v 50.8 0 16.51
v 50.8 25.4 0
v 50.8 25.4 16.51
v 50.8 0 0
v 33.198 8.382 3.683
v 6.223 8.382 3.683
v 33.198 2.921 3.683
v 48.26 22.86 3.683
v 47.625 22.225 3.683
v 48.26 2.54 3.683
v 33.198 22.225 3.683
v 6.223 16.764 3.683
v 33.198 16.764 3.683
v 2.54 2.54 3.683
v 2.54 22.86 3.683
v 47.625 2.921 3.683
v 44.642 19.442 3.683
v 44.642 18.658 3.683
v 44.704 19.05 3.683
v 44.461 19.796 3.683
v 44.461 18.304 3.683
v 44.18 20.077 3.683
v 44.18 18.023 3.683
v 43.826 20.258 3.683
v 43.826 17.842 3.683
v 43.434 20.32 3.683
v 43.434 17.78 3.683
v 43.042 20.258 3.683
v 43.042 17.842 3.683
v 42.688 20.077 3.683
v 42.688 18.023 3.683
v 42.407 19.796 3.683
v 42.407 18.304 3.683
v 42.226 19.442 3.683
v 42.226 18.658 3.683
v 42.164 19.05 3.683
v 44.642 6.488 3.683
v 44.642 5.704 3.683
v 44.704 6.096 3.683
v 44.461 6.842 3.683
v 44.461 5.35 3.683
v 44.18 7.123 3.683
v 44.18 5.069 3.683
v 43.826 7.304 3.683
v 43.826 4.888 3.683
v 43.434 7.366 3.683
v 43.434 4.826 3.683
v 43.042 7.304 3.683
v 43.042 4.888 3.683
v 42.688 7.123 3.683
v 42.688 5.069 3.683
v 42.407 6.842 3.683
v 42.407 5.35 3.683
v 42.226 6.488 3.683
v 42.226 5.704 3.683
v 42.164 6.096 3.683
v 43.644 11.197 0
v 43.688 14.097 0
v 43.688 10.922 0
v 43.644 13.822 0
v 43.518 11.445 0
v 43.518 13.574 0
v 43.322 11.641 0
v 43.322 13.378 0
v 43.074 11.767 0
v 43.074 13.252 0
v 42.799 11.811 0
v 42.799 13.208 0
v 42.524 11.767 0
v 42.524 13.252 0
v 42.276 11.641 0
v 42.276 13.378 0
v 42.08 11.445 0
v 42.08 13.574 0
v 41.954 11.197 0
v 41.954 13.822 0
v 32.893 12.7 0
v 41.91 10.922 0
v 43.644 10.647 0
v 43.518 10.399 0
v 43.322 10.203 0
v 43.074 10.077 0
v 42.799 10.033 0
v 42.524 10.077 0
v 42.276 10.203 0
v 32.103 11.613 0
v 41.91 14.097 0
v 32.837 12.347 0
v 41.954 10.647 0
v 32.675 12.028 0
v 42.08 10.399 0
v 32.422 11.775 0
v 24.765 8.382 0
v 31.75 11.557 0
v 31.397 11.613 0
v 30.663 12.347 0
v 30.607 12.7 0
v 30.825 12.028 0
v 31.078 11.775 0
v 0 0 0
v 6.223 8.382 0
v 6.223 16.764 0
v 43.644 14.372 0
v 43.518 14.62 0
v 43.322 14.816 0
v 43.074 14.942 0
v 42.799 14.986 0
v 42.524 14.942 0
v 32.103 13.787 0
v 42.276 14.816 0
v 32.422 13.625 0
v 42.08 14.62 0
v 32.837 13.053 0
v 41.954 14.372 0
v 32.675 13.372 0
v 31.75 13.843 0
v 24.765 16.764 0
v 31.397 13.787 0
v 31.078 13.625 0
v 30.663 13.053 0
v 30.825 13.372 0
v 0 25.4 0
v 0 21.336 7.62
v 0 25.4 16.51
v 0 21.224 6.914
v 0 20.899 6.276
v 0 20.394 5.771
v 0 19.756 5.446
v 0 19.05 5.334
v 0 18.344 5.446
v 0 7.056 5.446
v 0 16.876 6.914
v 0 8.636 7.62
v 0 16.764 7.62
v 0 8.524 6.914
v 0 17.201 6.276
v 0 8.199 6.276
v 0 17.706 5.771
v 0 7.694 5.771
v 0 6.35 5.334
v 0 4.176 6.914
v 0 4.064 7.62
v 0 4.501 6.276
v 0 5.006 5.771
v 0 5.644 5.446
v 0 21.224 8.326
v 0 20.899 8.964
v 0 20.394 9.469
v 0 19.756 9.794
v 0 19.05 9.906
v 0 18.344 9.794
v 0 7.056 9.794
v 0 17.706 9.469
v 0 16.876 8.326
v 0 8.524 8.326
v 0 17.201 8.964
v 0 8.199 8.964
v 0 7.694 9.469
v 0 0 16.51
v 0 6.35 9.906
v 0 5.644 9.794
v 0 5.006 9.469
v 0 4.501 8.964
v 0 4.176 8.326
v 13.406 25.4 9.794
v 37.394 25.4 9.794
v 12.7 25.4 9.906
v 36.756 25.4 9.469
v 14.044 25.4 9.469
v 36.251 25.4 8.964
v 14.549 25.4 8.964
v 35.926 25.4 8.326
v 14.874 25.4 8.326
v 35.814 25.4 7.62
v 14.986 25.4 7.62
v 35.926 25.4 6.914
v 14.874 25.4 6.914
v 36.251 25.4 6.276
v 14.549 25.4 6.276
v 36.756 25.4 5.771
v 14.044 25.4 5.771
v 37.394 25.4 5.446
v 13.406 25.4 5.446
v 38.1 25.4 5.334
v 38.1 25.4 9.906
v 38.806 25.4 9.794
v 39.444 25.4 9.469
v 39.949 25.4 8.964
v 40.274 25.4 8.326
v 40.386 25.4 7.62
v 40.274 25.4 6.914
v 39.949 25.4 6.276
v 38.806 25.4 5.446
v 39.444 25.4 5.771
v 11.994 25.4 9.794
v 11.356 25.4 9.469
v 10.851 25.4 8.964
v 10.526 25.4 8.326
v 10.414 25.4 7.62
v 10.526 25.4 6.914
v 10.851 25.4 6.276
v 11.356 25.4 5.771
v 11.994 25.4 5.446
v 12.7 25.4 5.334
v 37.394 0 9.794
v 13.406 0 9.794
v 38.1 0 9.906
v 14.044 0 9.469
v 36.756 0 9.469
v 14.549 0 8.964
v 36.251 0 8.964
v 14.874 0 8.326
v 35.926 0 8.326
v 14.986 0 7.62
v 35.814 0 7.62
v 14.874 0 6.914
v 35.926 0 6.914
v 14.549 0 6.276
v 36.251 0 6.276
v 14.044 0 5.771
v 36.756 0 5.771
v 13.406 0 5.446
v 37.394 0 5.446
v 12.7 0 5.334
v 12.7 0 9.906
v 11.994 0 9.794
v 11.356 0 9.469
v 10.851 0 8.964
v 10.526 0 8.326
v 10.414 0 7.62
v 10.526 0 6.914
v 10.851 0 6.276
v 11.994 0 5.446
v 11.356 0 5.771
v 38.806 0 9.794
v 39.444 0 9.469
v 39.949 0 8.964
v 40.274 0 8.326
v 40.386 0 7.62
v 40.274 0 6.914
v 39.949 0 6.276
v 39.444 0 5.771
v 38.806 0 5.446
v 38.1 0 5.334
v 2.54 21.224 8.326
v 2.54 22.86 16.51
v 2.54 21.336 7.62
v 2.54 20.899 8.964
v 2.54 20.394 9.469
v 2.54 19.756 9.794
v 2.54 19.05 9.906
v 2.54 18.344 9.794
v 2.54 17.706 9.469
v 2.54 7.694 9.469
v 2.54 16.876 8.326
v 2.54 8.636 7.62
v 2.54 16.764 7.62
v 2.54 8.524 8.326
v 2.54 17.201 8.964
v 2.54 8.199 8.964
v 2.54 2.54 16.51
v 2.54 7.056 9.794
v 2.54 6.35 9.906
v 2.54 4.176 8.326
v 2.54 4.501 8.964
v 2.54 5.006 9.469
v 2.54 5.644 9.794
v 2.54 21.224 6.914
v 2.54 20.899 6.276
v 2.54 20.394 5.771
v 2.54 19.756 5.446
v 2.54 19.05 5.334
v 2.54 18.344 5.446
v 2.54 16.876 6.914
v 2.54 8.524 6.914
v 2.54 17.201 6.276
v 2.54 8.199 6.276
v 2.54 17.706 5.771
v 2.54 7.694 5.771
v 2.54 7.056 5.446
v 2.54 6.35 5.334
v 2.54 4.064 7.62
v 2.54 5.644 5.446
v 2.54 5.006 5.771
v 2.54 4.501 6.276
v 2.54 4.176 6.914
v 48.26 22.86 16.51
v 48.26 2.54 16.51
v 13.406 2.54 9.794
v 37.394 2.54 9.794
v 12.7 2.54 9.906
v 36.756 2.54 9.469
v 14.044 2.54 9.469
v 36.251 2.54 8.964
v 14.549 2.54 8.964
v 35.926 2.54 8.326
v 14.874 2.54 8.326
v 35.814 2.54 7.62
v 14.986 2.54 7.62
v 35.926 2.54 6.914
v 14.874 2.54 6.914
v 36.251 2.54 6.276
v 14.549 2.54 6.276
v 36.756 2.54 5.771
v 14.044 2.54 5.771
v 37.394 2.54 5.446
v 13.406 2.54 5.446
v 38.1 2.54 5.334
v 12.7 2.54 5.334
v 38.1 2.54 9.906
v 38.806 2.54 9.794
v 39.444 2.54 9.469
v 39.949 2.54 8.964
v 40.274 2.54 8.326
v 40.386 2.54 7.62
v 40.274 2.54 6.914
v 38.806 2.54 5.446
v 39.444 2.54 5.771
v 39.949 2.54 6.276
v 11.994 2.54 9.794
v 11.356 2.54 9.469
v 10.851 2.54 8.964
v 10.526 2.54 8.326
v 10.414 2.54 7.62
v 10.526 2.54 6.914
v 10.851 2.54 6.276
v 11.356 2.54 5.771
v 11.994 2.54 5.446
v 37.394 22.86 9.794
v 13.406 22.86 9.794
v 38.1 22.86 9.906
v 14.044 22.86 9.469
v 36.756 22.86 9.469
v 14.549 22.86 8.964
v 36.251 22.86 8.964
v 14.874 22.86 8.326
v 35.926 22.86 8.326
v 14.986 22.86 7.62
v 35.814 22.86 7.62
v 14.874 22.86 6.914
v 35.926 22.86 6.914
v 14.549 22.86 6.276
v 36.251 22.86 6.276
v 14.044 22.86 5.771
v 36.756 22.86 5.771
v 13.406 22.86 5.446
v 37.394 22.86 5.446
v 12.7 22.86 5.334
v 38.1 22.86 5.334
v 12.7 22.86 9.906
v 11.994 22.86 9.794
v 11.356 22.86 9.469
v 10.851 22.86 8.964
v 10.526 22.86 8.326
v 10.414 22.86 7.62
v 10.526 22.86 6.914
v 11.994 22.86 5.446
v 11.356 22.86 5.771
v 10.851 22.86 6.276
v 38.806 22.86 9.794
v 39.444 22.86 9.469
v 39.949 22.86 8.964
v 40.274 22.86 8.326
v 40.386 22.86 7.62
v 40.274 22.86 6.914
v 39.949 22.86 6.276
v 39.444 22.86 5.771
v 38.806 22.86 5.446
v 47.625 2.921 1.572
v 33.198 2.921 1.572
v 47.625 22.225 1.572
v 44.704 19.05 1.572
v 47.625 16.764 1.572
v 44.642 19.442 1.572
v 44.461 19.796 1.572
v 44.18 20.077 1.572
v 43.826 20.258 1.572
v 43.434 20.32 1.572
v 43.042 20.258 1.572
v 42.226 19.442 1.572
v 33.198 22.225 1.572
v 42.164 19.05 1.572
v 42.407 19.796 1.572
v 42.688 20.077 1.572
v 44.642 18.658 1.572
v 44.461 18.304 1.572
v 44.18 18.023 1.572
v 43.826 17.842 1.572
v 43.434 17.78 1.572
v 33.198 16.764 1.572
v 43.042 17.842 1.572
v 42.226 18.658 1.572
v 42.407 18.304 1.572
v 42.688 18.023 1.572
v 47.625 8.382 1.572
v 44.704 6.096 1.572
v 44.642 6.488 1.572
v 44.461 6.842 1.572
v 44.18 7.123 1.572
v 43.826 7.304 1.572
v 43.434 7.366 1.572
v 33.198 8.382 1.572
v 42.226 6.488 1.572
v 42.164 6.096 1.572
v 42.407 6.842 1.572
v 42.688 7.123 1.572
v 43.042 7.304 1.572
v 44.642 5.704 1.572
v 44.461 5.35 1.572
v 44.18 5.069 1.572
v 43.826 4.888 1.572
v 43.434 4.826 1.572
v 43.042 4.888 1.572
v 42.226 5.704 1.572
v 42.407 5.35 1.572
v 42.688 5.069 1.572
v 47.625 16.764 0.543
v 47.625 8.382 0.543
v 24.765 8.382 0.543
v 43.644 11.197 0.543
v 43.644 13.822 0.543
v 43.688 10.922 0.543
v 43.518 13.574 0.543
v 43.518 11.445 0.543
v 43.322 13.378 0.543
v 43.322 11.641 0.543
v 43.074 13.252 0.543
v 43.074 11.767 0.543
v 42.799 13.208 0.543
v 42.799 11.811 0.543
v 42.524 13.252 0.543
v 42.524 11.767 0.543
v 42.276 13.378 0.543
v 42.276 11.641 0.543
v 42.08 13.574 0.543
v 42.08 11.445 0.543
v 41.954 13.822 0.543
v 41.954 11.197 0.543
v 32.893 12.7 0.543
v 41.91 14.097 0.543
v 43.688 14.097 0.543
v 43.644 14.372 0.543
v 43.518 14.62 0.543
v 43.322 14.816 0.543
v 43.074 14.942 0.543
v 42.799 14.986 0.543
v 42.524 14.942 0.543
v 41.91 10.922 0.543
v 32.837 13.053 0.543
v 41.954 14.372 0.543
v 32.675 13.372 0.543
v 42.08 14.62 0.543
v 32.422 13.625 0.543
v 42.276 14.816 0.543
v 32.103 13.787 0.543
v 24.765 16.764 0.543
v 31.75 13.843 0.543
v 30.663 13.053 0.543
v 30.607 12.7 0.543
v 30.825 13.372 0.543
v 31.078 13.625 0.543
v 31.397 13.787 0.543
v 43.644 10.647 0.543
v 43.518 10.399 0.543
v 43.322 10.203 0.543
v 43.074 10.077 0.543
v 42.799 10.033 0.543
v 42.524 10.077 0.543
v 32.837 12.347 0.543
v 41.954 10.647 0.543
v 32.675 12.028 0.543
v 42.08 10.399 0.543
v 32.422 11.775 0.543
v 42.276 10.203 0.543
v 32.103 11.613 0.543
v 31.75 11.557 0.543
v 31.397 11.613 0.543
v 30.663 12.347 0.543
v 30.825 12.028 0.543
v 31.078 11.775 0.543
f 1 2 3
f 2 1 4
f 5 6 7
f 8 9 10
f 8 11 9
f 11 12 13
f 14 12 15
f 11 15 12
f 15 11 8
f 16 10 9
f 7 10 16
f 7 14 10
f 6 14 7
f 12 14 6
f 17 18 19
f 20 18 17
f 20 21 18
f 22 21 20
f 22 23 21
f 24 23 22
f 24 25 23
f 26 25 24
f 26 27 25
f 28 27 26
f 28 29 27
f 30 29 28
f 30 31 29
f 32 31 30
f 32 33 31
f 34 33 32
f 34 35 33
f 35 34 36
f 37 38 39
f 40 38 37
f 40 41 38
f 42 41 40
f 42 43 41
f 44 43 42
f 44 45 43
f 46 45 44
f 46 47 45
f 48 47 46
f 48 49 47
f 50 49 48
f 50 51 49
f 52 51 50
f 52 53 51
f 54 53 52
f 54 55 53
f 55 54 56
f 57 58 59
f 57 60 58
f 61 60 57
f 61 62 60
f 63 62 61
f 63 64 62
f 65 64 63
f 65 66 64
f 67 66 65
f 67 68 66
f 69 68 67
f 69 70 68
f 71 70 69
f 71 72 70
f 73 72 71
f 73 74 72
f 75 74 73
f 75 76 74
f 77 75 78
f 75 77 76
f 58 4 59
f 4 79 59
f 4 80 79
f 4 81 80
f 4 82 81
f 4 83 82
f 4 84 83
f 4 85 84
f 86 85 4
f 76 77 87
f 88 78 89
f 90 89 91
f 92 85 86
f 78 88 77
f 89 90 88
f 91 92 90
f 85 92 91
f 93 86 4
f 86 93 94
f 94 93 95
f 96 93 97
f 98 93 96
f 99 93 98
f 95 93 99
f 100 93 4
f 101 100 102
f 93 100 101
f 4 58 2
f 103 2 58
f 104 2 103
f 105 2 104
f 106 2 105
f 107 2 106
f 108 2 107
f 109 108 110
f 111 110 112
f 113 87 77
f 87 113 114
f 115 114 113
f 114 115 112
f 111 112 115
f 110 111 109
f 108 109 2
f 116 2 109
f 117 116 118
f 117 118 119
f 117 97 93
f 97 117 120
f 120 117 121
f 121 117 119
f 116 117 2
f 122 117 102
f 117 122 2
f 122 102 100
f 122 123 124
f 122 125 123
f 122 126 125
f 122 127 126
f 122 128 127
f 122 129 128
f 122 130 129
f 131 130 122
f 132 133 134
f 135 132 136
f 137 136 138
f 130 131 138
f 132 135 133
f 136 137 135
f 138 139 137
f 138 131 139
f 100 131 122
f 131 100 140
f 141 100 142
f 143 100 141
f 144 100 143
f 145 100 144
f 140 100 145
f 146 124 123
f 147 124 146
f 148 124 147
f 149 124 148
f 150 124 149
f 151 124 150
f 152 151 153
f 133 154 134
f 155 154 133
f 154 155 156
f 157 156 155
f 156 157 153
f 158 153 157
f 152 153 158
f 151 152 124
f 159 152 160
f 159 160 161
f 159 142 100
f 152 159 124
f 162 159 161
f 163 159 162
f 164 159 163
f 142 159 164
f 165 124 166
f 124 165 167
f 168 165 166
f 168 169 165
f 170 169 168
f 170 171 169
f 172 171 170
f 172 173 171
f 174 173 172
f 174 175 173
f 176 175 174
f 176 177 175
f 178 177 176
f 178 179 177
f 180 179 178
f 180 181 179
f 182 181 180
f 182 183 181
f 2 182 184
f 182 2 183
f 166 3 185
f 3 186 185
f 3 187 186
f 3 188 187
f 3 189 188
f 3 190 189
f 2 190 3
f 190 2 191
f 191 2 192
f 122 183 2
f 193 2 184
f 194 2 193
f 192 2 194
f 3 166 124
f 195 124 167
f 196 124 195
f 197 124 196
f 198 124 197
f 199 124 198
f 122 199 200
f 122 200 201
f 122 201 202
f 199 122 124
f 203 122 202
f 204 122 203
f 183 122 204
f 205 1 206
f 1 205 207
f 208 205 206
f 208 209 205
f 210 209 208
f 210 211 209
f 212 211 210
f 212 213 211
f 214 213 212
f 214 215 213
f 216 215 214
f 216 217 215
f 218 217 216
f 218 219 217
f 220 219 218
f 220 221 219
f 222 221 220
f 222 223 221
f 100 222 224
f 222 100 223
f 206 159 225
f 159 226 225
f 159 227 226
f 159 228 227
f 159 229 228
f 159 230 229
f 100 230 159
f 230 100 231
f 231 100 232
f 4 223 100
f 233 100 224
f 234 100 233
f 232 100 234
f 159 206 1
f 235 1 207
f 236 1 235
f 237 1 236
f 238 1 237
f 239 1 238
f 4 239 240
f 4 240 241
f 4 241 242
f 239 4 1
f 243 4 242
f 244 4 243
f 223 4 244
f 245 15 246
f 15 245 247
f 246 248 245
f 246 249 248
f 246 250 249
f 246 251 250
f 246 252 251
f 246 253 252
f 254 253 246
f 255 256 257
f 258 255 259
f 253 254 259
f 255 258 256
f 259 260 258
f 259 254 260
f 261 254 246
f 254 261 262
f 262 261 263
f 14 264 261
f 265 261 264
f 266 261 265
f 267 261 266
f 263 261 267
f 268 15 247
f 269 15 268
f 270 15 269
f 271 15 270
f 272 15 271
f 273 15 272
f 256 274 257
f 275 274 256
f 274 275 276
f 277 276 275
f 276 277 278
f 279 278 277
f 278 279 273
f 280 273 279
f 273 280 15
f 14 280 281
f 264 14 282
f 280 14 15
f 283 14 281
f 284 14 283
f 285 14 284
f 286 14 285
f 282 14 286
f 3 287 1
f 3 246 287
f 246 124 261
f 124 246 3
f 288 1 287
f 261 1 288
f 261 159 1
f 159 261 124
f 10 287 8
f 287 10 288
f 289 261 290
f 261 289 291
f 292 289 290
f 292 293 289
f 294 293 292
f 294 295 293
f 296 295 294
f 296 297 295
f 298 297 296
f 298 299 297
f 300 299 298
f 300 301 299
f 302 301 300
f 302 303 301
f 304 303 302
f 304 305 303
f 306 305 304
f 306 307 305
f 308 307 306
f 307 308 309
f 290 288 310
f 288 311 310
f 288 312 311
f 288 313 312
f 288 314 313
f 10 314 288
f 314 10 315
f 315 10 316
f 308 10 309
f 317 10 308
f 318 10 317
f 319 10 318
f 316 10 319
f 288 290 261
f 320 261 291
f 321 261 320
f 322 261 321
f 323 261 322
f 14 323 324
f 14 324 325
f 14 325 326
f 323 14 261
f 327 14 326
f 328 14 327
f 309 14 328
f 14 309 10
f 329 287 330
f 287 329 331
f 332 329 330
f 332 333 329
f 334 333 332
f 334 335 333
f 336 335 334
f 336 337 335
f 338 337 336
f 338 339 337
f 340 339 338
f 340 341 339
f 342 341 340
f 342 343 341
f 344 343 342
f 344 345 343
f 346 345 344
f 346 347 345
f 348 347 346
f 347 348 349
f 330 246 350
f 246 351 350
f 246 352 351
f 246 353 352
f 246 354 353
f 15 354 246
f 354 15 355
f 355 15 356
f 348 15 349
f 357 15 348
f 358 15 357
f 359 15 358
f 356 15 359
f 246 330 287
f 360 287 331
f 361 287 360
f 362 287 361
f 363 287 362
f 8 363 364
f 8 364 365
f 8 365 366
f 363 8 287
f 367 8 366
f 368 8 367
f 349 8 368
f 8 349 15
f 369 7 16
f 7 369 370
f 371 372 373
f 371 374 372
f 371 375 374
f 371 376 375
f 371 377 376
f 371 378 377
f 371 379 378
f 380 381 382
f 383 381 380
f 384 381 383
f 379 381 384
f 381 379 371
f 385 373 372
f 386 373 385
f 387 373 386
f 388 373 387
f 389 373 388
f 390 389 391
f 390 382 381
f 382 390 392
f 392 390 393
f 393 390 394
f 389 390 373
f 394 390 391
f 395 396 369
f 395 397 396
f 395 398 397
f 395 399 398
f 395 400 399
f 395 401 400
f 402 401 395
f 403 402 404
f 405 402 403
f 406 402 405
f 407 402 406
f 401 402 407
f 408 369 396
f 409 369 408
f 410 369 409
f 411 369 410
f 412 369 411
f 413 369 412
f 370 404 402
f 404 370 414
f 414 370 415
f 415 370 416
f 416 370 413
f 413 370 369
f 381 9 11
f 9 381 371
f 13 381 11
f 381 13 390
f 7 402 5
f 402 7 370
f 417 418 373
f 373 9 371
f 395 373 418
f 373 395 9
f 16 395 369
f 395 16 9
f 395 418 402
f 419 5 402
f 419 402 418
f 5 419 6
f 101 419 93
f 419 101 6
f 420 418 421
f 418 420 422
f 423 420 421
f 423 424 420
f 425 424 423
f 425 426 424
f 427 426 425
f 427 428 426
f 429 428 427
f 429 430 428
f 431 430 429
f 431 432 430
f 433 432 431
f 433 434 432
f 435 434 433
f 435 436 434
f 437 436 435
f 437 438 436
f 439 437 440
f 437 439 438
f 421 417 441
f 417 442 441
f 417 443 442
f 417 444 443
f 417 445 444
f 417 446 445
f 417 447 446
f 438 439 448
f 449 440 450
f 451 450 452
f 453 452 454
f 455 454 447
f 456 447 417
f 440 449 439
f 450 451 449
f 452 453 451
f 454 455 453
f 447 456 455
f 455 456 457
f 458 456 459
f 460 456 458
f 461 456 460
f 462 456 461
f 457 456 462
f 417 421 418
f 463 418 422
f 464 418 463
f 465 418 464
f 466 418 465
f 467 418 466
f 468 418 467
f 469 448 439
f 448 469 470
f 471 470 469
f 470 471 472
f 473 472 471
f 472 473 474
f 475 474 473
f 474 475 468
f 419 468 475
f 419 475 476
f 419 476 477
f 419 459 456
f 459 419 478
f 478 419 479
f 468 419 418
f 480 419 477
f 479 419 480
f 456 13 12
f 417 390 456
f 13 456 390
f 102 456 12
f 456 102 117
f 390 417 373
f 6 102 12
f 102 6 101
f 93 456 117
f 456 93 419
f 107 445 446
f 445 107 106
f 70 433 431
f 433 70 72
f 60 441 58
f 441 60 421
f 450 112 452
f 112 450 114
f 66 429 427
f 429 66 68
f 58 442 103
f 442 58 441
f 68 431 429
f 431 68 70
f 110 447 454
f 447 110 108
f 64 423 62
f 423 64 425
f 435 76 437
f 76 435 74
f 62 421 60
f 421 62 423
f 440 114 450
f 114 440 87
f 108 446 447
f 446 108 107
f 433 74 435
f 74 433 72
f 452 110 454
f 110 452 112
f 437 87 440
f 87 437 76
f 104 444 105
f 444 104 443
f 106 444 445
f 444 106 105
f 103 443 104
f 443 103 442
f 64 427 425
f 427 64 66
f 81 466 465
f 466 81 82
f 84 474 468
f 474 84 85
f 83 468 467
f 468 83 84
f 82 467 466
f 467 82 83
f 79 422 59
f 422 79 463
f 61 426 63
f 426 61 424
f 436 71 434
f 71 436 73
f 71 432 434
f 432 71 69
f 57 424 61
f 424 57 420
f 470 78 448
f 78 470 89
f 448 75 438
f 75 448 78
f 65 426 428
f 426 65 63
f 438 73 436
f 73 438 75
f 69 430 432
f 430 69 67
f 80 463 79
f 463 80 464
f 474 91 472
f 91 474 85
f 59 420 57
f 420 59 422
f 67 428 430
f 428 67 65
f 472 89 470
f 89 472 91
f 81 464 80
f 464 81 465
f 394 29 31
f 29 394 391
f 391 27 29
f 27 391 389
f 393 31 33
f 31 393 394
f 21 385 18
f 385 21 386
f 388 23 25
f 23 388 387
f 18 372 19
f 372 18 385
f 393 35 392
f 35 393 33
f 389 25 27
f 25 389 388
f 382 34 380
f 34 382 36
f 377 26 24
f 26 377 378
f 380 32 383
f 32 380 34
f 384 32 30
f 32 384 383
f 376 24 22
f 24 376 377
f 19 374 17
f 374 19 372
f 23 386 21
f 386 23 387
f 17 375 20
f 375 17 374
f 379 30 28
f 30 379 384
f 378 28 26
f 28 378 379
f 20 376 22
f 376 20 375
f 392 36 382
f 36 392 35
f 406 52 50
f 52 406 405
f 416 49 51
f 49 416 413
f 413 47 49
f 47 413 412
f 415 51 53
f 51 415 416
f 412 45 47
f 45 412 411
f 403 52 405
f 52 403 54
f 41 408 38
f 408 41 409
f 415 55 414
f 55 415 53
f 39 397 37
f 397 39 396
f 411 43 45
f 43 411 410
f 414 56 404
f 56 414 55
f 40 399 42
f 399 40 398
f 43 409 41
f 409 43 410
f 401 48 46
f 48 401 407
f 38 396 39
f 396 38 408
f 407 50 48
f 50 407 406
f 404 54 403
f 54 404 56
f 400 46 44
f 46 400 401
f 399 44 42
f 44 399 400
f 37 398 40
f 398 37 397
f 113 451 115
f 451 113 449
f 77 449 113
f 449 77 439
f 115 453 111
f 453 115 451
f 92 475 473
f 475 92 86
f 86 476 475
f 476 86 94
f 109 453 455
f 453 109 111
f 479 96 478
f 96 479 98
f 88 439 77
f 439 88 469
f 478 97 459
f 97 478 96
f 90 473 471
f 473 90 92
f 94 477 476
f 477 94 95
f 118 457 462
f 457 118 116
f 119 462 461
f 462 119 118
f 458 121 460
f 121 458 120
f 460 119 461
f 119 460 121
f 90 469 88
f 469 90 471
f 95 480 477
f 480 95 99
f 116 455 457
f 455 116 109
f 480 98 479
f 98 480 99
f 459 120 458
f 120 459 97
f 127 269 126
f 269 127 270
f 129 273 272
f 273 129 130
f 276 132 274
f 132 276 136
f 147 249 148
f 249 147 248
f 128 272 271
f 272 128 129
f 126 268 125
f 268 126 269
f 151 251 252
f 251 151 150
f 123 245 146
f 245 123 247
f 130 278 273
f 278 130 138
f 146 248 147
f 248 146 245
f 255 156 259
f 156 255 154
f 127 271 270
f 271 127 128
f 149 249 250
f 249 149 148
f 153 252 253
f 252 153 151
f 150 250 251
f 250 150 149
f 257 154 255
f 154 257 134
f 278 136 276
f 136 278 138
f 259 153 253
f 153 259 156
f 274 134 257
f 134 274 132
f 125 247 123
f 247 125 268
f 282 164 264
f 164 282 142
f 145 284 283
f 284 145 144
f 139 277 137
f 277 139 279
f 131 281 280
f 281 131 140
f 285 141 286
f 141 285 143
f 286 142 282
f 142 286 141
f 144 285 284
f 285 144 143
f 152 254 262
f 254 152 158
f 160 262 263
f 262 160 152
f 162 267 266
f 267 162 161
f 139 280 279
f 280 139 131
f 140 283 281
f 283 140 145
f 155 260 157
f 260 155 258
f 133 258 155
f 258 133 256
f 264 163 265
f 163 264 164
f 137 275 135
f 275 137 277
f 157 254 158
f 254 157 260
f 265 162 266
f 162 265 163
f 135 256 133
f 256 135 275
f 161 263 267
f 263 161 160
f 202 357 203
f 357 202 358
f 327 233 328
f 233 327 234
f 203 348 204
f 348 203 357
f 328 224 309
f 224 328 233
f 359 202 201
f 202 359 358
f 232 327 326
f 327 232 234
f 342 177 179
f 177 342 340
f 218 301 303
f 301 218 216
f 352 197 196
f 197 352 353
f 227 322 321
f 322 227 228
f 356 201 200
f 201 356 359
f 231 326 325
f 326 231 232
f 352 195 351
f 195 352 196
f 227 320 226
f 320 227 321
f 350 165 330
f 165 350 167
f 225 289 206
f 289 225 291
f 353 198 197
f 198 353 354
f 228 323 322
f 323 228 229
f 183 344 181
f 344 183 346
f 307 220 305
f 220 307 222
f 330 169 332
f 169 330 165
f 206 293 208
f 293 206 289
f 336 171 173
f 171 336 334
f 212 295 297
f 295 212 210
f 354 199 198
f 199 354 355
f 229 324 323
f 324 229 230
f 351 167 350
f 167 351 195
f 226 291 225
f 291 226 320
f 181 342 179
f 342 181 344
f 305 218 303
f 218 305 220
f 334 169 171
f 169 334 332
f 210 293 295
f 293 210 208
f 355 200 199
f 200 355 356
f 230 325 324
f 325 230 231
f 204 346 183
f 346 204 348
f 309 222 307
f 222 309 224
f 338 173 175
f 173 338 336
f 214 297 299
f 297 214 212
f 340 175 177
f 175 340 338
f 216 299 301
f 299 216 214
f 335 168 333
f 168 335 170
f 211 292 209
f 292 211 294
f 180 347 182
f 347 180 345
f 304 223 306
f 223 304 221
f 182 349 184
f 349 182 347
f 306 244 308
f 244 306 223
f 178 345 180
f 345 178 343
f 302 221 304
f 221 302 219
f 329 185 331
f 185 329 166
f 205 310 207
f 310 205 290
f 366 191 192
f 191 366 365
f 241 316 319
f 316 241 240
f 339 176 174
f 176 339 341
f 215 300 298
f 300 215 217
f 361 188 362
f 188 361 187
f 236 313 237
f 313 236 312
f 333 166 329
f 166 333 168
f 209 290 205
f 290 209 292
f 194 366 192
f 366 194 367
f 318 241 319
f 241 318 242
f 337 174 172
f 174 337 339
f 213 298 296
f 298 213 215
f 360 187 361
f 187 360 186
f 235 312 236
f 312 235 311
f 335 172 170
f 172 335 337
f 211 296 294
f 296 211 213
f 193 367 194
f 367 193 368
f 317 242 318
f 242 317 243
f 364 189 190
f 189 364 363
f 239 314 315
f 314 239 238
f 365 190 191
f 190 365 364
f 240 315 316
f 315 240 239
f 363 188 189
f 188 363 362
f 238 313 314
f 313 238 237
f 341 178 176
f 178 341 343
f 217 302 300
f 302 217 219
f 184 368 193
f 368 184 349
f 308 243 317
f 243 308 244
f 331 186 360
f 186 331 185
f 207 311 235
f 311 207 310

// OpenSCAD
/* version 3 - walls on all four sides of the box.
	based on ideas from robot base mounting, feb 18.
*/

width=inch(1);
thickness=inch(0.125);

mtgthick=inch(0.1);

extra_thick=inch(0.020);

length=inch(2);
diagthick=2;

holedia = inch(0.180);

function inch(a) = a*25.4;

module mytriangle()
{
    intersection() {
	cube([width, diagthick, width]);
	translate([-width+6, 0, 0]) {
	    rotate([0, 45, 0]) {
		cube([width, diagthick, width]);
	    }
	}    
    }
}

module bracket() {
    union(){
	// bottom - where sensor goes
	cube([inch(2),   inch(1), thickness+extra_thick  ]);   

	// vertical mounting tabs - short sides
	cube([mtgthick, inch(1), inch(0.65)]);

	translate([inch(2)-mtgthick, 0, 0]) {
	    cube([mtgthick, inch(1), inch(0.65)]);
	}

	// long sides
	cube([inch(2), mtgthick, inch(0.65)]);

	translate([0, inch(1)-mtgthick, 0]) {
	    cube([inch(2), mtgthick, inch(0.65)]);
	}


    }
}

// positive model of wcp hall-effect sensor
module wcp971() {

    difference() {
	union(){
	    cube([inch(.760), inch(.568), inch(.0635)+extra_thick]);
	    translate([ inch((.760-.330)/2), 0, 0]) {
		cube([ inch(.330), inch(1.500), inch(.104)+extra_thick]);
	    }
	    translate([ inch((.760-.330)/2), inch(0.9), 0]) {
		cube([ inch(.330), inch(0.730), inch(.2)]);
	    }
	    
	    translate([inch((.760-.12)/2 ), inch(.190), -1]) {
		cylinder(h=8, d=inch(.07),  $fn=20);
	    }
	    translate([inch(.760-(.750-.12)/2 ), inch(.190), -1]) {
		cylinder(h=8, d=inch(.07),  $fn=20);
	    }

 
	}

	translate([inch((.760-.510)/2 ), inch(.165), -1]) {
	    cylinder(h=8,d=inch(.100),  $fn=20);
	}

	translate([inch(.760 - (.760-.510)/2 ), inch(.165), -1]) {
	    cylinder(h=8,d=inch(.100),  $fn=20);
	}

    }
}

// put it all together
union(){
    difference () {
	bracket();

	translate([inch(1.875),inch(.875), thickness+0.010+extra_thick]) {
	    rotate([0,180,90]) {
		wcp971();
	    }
	}

	// hole to aid in removing sensor from bracket
	translate([inch(1.25), inch(0.5), -1]) {
	    cylinder(h=8,d=inch(0.09),  $fn=20);
	}

	    // holes in vertical mounting frame - short side
	translate([-1, inch(0.75),inch(0.3) ]) {
	    rotate([0,90,0]) {
		cylinder(h=8,d=holedia,  $fn=20);
	    }
        }
	translate([-1, inch(0.25), inch(0.3) ]) {
	    rotate([0,90,0]) {
		cylinder(h=8,d=holedia, $fn=20);
	    }
        }

	// holes in vertical mounting frame - long sides
	translate([inch(0.5), -1, inch(0.3) ]) {
	    rotate([0,90,90]) {
		cylinder(h=inch(2),d=holedia,  $fn=20);
	    }
        }

	translate([inch(1.5), -1, inch(0.3) ]) {
	    rotate([0,90,90]) {
		cylinder(h=inch(2),d=holedia,  $fn=20);
	    }
        }	
    }
}
